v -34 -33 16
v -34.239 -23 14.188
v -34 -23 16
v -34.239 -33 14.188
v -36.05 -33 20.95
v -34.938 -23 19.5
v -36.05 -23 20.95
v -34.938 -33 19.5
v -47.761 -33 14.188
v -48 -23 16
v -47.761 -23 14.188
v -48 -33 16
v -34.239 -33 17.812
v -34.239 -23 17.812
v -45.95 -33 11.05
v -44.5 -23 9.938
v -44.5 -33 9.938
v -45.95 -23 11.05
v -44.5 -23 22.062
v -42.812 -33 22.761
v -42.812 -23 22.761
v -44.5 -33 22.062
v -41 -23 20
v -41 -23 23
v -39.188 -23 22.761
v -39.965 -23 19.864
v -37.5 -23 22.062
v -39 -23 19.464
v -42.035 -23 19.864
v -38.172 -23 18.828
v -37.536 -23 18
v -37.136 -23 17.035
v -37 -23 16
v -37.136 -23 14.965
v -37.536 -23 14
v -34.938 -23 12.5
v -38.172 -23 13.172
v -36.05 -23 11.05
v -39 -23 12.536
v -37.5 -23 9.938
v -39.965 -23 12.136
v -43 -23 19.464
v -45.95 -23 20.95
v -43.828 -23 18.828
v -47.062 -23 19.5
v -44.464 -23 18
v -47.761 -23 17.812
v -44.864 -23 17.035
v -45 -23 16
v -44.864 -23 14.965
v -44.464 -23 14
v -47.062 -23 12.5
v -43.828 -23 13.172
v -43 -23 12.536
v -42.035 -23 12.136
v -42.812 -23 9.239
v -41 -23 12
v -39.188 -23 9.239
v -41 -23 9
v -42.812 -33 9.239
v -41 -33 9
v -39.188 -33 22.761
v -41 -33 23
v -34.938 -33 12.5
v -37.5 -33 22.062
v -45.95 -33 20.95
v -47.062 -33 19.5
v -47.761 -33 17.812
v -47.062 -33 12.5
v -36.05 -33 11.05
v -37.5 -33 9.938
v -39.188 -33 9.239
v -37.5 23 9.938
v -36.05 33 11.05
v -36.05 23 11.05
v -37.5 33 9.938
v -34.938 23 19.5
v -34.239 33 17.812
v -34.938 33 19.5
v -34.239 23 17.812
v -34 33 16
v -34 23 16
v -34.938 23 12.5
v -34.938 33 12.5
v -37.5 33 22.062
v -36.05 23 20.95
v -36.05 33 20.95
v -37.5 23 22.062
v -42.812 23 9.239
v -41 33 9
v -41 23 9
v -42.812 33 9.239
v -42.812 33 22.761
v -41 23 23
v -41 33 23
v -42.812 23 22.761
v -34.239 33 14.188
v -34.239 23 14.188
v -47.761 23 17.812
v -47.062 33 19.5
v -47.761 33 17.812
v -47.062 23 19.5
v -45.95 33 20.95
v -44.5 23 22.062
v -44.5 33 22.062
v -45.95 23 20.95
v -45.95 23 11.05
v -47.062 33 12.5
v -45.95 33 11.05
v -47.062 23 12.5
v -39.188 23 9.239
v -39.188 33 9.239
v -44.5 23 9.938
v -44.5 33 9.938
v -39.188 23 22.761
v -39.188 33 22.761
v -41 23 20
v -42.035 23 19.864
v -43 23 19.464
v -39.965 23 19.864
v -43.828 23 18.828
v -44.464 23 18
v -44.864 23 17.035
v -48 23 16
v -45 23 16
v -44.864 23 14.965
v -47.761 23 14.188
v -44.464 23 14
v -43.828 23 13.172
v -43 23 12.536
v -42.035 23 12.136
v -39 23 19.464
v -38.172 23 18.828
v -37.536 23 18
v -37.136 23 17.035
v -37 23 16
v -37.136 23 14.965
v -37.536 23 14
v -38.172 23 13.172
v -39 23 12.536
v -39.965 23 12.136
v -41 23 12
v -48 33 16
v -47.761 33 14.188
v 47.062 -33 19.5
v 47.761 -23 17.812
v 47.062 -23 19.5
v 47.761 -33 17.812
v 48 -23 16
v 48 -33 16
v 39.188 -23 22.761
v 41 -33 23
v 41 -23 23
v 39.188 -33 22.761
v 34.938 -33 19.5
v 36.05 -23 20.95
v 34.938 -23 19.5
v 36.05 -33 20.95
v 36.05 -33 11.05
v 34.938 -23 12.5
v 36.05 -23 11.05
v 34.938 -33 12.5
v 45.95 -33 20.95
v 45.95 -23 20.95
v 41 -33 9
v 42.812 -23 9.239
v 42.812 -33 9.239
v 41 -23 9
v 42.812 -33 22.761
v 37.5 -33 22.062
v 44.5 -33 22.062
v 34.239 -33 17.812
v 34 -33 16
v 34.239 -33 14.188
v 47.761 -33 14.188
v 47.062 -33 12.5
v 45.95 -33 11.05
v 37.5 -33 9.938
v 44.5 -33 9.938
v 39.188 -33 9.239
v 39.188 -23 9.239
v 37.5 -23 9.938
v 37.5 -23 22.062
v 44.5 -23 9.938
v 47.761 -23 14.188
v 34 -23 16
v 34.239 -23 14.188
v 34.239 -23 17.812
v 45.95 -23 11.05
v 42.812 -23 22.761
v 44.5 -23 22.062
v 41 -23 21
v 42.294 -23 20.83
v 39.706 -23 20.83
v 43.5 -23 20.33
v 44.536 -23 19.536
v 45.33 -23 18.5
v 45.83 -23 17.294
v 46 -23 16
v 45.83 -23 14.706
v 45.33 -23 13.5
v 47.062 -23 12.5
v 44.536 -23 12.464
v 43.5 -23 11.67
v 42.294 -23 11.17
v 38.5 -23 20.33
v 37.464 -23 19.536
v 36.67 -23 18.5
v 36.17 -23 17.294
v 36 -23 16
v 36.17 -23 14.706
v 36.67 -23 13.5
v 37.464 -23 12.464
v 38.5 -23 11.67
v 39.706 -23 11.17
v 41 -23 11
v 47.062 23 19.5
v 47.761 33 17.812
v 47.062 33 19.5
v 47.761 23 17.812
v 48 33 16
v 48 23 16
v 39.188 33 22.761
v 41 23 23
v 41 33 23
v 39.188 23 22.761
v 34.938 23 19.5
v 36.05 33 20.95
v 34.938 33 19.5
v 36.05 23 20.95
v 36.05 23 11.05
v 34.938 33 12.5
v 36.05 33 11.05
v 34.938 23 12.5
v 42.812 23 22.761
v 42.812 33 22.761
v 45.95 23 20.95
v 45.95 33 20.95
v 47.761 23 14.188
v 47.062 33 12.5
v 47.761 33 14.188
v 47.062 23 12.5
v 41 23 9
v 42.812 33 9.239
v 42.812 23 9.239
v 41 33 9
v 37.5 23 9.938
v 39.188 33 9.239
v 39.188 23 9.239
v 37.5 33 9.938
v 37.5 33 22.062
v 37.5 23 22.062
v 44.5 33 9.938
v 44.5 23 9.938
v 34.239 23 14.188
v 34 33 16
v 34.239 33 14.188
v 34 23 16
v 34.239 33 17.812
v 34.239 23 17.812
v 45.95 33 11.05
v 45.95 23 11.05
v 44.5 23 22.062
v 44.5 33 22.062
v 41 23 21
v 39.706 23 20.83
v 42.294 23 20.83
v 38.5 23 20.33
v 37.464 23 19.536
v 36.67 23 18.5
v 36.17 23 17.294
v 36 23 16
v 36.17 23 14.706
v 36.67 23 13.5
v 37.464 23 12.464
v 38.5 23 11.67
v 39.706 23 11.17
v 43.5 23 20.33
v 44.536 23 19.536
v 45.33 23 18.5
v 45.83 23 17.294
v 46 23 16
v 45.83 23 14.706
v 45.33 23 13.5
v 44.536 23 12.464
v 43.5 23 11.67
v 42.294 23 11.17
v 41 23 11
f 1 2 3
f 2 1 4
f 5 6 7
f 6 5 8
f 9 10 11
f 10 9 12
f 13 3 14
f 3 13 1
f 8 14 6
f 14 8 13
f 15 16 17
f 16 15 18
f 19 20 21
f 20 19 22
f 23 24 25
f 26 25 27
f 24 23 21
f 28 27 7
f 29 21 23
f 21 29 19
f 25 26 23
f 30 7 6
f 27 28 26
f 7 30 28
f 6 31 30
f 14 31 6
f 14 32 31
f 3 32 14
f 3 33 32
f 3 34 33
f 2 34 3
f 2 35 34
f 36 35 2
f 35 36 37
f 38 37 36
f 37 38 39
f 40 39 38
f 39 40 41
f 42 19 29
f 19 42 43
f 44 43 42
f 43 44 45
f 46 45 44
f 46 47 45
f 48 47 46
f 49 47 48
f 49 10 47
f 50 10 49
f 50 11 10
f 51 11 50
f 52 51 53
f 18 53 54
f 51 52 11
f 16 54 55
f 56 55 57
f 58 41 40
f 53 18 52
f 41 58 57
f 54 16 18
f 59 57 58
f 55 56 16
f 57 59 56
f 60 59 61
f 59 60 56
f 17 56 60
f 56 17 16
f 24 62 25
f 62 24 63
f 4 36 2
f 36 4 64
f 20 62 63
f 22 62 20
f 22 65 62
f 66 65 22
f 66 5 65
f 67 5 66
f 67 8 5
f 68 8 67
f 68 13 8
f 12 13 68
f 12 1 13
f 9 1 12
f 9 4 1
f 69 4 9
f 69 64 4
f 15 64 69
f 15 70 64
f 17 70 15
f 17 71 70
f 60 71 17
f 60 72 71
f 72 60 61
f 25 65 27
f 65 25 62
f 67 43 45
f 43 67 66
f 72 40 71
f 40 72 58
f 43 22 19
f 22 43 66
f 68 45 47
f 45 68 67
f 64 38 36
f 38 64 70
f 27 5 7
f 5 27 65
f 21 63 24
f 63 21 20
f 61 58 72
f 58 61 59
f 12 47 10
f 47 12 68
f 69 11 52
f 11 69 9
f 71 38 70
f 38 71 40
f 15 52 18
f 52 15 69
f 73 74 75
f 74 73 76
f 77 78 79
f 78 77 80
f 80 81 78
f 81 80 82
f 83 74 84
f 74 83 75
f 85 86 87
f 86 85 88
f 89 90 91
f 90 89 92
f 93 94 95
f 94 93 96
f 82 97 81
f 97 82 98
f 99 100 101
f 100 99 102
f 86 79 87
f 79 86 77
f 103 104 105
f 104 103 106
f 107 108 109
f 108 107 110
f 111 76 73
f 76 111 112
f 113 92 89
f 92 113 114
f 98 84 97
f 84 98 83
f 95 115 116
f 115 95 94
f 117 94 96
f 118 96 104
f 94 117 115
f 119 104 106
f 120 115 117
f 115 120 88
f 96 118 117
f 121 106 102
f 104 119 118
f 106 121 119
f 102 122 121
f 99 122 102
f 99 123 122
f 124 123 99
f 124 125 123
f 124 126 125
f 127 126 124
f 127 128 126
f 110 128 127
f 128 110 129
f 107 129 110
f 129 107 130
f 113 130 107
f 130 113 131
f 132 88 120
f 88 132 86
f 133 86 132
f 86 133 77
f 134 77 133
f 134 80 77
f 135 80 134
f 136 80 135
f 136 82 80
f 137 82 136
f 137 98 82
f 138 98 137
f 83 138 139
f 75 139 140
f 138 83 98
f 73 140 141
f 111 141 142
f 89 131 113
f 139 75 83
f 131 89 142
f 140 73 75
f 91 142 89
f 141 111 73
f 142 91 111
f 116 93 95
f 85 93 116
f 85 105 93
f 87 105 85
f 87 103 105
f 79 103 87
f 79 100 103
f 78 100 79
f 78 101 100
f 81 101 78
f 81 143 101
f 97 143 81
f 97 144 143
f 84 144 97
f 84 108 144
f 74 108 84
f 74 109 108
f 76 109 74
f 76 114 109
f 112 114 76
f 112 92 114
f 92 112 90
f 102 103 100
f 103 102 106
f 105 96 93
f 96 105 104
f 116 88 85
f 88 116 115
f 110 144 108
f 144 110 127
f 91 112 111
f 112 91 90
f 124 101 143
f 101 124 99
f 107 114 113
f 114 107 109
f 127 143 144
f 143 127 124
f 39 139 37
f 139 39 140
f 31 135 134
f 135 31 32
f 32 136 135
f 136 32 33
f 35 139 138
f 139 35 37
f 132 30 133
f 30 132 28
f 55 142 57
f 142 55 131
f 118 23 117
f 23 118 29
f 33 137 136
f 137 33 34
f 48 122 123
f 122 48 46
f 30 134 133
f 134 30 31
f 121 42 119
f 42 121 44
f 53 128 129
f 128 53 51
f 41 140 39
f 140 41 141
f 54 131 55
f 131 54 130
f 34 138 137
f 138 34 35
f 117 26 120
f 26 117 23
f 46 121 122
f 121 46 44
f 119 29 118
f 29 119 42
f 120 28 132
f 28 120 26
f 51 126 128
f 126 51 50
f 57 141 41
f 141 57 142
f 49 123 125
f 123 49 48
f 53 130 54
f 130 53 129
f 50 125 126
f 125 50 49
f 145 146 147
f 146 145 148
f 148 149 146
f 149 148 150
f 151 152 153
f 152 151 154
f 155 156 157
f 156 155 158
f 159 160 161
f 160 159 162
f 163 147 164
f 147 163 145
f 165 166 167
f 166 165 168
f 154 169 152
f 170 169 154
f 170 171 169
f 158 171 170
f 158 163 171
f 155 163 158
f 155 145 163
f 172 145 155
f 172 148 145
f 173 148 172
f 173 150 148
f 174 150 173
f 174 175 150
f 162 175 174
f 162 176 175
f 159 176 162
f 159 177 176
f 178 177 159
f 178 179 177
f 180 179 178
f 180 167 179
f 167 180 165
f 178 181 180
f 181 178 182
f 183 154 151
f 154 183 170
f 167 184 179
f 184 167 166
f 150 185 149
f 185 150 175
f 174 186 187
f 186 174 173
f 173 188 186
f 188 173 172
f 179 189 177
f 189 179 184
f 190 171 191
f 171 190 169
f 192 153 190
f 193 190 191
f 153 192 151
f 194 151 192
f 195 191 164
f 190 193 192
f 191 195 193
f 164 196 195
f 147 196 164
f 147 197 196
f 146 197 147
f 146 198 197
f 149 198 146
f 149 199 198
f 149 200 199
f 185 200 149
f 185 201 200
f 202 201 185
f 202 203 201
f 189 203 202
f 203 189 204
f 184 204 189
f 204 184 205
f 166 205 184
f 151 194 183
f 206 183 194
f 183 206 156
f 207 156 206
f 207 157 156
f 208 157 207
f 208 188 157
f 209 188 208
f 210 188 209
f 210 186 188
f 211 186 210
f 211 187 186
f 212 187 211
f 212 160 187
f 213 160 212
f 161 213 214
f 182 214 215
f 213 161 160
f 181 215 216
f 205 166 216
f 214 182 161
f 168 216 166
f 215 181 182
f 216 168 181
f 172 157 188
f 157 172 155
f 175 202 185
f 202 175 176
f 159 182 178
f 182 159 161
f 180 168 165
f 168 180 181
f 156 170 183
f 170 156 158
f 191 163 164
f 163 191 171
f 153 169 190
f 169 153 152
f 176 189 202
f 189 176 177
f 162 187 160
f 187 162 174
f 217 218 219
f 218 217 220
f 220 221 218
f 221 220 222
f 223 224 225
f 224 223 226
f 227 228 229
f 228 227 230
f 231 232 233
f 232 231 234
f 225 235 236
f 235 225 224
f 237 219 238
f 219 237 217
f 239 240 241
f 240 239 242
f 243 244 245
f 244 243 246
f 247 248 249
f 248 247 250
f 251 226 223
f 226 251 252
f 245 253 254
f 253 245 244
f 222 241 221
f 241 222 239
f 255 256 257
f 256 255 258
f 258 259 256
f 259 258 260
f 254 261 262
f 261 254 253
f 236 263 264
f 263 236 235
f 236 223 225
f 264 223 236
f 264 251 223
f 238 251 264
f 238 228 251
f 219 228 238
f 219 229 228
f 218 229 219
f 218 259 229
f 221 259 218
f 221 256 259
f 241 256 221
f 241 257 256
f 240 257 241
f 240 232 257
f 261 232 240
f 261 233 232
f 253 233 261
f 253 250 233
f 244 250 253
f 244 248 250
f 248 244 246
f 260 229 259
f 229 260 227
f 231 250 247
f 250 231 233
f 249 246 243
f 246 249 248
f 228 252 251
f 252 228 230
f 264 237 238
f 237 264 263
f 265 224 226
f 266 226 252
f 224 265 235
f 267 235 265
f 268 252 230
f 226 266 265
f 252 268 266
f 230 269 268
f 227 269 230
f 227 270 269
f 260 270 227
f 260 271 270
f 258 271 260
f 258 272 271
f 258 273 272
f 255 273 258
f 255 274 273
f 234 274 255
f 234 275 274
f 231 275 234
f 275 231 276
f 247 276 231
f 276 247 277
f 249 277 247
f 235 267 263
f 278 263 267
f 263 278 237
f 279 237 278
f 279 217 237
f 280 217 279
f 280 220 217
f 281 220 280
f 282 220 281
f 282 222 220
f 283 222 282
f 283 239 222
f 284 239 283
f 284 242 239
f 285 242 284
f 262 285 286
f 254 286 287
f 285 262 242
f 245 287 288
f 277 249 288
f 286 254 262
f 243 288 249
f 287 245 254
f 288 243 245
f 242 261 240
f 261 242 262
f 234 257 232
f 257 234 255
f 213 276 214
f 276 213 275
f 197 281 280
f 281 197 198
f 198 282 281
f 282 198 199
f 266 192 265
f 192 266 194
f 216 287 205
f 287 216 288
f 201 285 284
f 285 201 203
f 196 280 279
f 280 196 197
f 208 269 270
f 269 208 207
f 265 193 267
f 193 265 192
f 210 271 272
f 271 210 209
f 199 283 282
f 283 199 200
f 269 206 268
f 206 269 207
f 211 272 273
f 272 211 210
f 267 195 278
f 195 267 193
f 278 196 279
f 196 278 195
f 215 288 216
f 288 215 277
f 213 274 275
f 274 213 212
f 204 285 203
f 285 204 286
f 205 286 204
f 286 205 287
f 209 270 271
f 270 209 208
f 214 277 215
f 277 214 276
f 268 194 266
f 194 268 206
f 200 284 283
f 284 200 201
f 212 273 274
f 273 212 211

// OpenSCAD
// file: chassis.scad
include <parameters.scad>

module crossTrackAxle(x, z, driven = false) {
    // Aluminum axles — 1/3 weight of steel
    color(matAluminum)
        translate([x, 0, z])
            rotate([90, 0, 0])
                cylinder(r = driven ? 5 : 4,
                         h = trackCenterY * 2 + 8,
                         center = true, $fn = 24);

    for (side = [-1, 1])
        color(matDarkSteel)
            translate([x, side * trackCenterY, z])
                rotate([90, 0, 0])
                    cylinder(r = 7, h = 10, center = true, $fn = 24);
}

module chassis() {
    // No cross-members — footrest and hydraulic mount to L-bracket
    // arm cross-braces under the seat instead.

    // Aluminum axles.
    crossTrackAxle(-idlerX, idlerZ, false);
    crossTrackAxle(idlerX, idlerZ, true);
}
// file: parameters.scad
// Shared parameters for tracked wheelchair prototype
// NOTE: 1 unit = 1 cm (seat target 450 mm = 45 units above ground).
$fn = 48;

//================ MATERIALS =================//
// Frame: aluminum 6061-T6 (lightweight)
// Seat: carbon fiber T700 + honeycomb (ultralight)
// Suspension: rubber bushings (lightweight)
// Axles: aluminum 7075-T6 (1/3 weight of steel)
matSteel      = [0.35, 0.36, 0.38];   // hardware / fasteners only
matDarkSteel  = [0.25, 0.26, 0.28];
matRubber     = [0.12, 0.12, 0.14];   // track belt + bushings
matAluminum   = [0.55, 0.57, 0.60];   // primary frame material
matChrome     = [0.70, 0.72, 0.75];
matCarbon     = [0.15, 0.15, 0.18];   // (unused — seat now aluminum)
matLeather    = [0.45, 0.25, 0.12];   // leather cushion color

//================ TRACKS =================//
trackLength = 82;
trackWidth = 14;
trackCenterY = 28;

idlerRadius = 10;
idlerX = trackLength / 2;
idlerZ = 16;
roadRadius = 7;
roadZ = 13;  // road wheels roll on the belt's inner surface (belt upper edge at this height)
roadPositions = [-22, -6, 10, 24];

linkLength = 10;
linkWidth = trackWidth + 2;
linkThickness = 3;
linkGap = 1;
// Belt centerline clears the idler wheels plus link half-thickness,
// so the links ride on the wheels instead of clipping through them.
trackRadius = idlerRadius + linkThickness / 2;  // = 11.5
beltThickness = 3;
groundZ = idlerZ - trackRadius;  // bottom of track = ground level (4.5)

//================ HYDRAULIC JACK WHEEL =================//
trackTilt = 0;
liftPivotX = idlerX;
liftPivotZ = idlerZ;
// Electric linear actuator (24V DC, 500kg, 300mm stroke).
// 1/3 weight of hydraulic system.
hydrWheelRadius = 4;
hydrWheelWidth = 10;
hydrBarrelRadius = 4;        // smaller barrel (mini actuator)
hydrBarrelHeight = 12;       // shorter barrel
hydrRodRadius = 2;
// At full extension the jack wheel rests on the ground:
// mountZ 35 - groundZ 4.5 - wheelR 4 = 26.5
hydrExtend = 26.5;
hydrRetracted = 0;
hydrExtendAmount = hydrExtend;
hydrMountX = 10;   // jack mount x; moved forward (from 24) for first-stair clearance
hydrMountY = 0;

//================ CHASSIS =================//
chassisLength = 82;
chassisBottom = 35;
chassisHeight = 12;

//================ SEAT =================//
// Seat geometry: flat aluminium pan + leather cushion + slim backrest.
// Seat surface rides at 450 mm (45 units) above the ground.
// topZ = idlerZ + seatTopOffset = 49.5, ground at 4.5 -> seat 45 above ground.
seatPanLength = 66;
seatPanWidth = 66;
backShellHeight = 72;
headrestHeight = 16;
seatTopOffset = 45 - trackRadius;  // = 33.5
// Backrest recline (deg from vertical).
seatBackRecline = 8;

//================ FOOTREST =================//
footrestWidth = 34;
footrestLength = 28;
footrestThickness = 3;       // 3mm aluminum plate
footrestHeight = idlerZ + 12;
footrestFrontX = -30 - footrestLength / 2;  // plate center, extends forward from arm end

// Folding footplate pivots at the end of the L-bracket arm.
footPivotX = -30;                           // end of L-bracket horizontal arm
footPivotZ = idlerZ + seatTopOffset - 7;    // arm height (panB - 2)
footHeelGuard = true;                       // optional heel guard
footToeGuard = false;                       // optional toe guard (off by default)

//================ ARMRESTS =================//
armPivotX = idlerX - 14;                     // rear post at the seat back
armLength = 68;                              // full-length pad (covers seat depth)
armPadHeight = idlerZ + seatTopOffset + 19;  // pad top = elbow height (~19 above seat top)
armPadWidth = 8;
armPadThick = 4;
// main file
// STL EXPORT: Chassis (axles only, no cross-members)
include <parameters.scad>
use <chassis.scad>
chassis();
